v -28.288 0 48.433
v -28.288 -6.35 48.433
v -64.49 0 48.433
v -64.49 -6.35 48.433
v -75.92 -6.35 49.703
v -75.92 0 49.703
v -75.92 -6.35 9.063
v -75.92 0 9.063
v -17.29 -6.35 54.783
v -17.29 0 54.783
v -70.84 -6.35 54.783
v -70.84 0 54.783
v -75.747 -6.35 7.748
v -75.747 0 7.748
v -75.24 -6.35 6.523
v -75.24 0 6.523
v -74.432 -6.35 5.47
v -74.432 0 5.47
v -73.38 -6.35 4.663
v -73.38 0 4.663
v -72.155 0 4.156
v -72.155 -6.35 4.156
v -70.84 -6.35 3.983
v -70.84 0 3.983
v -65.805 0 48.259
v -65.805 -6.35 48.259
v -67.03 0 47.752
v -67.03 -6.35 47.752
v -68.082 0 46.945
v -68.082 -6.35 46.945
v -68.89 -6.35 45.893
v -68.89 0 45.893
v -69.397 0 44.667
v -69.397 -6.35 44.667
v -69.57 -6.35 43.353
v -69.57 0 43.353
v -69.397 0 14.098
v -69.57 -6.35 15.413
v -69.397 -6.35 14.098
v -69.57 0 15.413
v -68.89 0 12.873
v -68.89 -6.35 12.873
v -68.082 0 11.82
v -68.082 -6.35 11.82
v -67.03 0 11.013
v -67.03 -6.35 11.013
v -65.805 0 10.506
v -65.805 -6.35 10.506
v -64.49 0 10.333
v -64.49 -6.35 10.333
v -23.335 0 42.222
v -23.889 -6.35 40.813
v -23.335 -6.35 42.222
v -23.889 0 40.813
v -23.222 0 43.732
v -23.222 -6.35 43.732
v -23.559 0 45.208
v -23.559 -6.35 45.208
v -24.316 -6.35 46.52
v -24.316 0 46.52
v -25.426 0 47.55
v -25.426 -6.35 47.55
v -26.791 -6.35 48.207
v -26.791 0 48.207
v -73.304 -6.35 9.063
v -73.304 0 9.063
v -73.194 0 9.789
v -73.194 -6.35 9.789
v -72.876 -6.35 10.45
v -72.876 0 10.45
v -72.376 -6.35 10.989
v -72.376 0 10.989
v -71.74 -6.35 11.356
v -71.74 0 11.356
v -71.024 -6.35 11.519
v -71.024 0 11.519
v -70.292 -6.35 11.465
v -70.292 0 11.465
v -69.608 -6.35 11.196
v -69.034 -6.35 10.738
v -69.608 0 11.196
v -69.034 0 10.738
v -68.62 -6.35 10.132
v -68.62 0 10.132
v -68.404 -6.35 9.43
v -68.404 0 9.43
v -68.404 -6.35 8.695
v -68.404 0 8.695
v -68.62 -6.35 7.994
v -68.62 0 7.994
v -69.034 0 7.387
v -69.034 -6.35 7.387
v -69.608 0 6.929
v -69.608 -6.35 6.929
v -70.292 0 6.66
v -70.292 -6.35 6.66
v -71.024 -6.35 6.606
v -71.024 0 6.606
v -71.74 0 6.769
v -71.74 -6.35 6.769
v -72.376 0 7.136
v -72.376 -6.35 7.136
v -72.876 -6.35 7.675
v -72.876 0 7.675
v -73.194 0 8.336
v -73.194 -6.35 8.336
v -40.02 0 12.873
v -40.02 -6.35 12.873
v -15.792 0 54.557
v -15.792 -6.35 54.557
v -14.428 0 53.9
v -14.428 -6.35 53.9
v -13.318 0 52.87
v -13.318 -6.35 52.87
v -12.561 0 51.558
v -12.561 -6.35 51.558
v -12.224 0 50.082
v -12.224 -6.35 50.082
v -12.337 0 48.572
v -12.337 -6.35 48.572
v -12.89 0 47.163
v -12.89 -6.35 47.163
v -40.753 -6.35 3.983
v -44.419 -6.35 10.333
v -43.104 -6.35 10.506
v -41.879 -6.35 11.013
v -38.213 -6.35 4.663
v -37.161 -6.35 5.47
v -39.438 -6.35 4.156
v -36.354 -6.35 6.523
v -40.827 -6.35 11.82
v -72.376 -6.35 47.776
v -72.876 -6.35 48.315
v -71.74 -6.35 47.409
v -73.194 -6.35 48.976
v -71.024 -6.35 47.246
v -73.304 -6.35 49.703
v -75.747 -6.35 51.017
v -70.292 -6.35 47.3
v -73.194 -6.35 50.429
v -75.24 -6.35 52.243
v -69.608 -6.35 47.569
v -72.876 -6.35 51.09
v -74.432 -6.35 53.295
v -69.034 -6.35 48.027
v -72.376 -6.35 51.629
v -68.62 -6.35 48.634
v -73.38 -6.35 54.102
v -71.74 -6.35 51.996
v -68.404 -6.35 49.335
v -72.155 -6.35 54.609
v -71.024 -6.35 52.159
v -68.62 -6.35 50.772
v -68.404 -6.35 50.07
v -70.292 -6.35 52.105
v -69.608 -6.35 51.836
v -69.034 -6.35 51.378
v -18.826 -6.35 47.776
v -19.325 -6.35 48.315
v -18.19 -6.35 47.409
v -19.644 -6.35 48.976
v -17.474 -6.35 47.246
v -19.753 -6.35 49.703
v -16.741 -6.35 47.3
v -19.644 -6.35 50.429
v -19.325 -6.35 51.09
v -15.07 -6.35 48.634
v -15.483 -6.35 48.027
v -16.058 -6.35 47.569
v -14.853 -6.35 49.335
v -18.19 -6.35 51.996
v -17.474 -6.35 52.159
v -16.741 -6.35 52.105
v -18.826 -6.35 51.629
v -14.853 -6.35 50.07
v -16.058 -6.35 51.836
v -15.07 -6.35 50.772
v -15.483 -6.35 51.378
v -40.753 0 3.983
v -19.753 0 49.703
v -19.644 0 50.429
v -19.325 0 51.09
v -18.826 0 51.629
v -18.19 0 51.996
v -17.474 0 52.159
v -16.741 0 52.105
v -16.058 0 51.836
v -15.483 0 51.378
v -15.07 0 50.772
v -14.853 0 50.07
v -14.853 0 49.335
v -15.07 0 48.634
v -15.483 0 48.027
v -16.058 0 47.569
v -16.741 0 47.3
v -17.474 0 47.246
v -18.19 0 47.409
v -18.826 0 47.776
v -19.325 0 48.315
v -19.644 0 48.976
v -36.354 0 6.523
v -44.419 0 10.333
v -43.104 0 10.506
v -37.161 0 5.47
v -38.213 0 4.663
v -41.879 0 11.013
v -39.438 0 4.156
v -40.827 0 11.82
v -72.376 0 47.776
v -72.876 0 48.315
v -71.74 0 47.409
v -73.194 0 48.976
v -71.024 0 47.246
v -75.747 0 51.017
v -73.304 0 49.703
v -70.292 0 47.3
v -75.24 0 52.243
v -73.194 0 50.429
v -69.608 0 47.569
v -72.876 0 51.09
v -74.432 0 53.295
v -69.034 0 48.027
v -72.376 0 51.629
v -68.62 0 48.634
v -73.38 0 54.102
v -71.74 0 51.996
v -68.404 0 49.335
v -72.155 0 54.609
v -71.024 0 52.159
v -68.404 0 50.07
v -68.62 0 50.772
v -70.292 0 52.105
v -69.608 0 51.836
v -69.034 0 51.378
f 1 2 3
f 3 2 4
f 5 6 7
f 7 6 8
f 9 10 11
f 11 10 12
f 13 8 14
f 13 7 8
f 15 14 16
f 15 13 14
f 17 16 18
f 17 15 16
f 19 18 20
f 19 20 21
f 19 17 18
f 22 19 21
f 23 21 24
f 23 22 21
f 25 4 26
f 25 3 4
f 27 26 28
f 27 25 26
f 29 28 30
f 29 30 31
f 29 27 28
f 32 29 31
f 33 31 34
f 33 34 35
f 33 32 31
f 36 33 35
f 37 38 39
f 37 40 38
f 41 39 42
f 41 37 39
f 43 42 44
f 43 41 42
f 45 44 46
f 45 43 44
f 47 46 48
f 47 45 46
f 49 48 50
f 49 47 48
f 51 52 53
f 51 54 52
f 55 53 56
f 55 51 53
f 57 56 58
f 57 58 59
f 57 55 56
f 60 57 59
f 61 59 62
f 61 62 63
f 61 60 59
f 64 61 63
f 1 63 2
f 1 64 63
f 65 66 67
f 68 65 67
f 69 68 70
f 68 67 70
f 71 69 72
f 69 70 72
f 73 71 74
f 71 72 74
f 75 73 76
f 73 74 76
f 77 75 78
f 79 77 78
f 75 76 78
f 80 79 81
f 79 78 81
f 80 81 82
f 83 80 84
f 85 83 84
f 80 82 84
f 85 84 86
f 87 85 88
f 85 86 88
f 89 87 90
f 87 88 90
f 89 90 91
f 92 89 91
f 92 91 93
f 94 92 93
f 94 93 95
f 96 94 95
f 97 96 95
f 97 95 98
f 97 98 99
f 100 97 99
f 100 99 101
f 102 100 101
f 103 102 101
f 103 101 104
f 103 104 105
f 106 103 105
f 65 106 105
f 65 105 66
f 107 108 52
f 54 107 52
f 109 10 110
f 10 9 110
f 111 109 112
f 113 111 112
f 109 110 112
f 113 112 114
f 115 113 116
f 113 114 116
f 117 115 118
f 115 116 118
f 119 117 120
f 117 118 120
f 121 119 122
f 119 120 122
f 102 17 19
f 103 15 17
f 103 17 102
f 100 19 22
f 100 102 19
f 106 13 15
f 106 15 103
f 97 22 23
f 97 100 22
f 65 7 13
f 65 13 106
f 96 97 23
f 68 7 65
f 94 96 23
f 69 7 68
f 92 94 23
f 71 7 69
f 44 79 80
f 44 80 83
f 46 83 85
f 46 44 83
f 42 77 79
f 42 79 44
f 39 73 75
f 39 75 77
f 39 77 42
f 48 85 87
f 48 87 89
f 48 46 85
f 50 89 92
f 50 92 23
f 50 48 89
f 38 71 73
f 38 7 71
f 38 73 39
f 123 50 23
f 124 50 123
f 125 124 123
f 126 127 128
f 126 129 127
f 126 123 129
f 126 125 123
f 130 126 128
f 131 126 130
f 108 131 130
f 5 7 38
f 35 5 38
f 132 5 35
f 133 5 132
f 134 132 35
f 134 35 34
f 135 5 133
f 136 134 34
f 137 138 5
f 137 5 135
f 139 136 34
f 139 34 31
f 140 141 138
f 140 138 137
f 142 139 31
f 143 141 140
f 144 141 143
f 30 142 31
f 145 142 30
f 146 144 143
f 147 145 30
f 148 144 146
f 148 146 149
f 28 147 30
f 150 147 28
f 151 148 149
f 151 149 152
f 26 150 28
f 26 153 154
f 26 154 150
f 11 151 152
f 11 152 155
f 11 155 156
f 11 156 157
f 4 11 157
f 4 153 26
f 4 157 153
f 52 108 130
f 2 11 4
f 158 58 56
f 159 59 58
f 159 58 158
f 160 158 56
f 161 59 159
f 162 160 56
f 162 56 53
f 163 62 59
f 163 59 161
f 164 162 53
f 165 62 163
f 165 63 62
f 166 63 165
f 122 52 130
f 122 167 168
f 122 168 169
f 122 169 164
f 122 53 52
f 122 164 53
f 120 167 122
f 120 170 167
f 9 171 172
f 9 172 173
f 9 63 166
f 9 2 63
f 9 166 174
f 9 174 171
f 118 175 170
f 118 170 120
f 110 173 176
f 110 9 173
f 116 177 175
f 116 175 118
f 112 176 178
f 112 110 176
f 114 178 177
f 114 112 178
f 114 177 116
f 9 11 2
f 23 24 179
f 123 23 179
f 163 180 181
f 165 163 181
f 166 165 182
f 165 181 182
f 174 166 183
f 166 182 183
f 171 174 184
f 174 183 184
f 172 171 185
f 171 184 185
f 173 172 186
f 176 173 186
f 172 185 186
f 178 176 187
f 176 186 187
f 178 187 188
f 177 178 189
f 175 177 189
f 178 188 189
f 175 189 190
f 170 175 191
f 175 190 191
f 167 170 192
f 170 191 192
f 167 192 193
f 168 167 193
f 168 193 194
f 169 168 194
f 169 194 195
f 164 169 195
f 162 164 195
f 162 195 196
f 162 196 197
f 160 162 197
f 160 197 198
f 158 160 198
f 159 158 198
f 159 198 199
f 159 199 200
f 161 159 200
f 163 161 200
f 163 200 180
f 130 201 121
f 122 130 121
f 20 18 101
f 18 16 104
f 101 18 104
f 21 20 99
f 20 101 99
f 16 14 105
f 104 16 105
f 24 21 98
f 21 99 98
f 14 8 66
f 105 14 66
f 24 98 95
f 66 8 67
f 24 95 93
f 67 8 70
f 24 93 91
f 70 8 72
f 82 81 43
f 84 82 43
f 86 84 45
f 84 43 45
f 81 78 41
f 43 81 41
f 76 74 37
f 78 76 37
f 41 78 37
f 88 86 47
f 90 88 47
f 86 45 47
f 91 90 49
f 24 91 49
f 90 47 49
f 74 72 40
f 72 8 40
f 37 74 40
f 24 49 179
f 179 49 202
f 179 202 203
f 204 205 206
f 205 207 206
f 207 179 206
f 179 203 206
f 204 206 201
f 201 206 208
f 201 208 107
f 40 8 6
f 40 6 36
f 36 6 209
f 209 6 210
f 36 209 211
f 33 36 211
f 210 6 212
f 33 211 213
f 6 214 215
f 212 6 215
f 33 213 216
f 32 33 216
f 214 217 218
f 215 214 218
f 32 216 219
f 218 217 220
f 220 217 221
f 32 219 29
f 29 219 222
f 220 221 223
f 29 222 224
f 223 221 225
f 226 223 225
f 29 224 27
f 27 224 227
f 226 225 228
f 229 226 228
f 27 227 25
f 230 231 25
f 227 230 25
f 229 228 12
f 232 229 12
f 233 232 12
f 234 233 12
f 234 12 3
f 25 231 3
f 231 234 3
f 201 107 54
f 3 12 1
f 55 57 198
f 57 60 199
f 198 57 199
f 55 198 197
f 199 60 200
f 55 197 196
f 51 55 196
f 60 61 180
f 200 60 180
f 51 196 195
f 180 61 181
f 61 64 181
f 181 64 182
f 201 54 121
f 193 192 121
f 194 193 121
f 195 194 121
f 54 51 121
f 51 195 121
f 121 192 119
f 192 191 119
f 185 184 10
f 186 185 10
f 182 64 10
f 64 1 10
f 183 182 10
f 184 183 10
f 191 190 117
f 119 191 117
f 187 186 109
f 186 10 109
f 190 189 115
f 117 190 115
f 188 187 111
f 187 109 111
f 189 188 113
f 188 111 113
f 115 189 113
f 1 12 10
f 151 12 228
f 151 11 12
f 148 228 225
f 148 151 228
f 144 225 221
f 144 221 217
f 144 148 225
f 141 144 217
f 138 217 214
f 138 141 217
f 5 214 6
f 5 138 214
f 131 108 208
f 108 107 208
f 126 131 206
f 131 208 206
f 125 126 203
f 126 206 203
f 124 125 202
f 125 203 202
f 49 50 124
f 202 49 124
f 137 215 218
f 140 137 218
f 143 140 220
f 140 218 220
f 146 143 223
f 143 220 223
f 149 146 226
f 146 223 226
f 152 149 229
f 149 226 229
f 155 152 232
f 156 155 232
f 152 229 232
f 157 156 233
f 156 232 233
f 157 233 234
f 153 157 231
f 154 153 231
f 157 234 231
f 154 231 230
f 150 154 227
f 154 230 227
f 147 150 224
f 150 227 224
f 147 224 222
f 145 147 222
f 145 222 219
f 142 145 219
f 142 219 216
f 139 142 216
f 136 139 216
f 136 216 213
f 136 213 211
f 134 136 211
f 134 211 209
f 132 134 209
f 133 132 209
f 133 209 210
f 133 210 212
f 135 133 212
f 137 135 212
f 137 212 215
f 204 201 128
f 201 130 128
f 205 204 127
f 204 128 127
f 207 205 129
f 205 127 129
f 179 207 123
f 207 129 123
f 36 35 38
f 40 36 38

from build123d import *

# Parameters (mm, degrees)
F1_DEPTH = 6.35
F3_DEPTH = 25.4
F4_R     = 5.08
F5_R     = 5.08
F7_D     = 4.9276


with BuildPart() as f1:
    # F0 (on Front) → F1 (new body)
    with BuildSketch(Plane.XZ):
        Polygon((-8.49073, 54.782512), (-75.920123, 54.782512), (-75.920123, 3.982512), (-37.820123, 3.982512), align=None)
    extrude(amount=F1_DEPTH)

    # F2 (on face) → F3 (cut)
    with BuildSketch(Plane.XZ.offset(6.35)):
        Polygon((-41.486298, 10.332512), (-19.489252, 48.432512), (-69.570123, 48.432512), (-69.570123, 10.332512), align=None)
    extrude(amount=-F3_DEPTH, mode=Mode.SUBTRACT)

    # F4
    f4_edges = [f1.edges().sort_by_distance(p)[0] for p in [
        (-8.49073, -3.175, 54.782512),
        (-75.920123, -3.175, 54.782512),
        (-37.820123, -3.175, 3.982512),
        (-75.920123, -3.175, 3.982512),
    ]]
    fillet(f4_edges, radius=F4_R)

    # F5
    f5_edges = [f1.edges().sort_by_distance(p)[0] for p in [
        (-41.486298, -3.175, 10.332512),
        (-69.570123, -3.175, 10.332512),
        (-69.570123, -3.175, 48.432512),
        (-19.489252, -3.175, 48.432512),
    ]]
    fillet(f5_edges, radius=F5_R)

    # F7 (through all)
    with Locations(Plane.XZ.offset(6.35)):
        with Locations((-70.840123, 49.702512), (-70.840123, 9.062512), (-17.289548, 49.702512)):
            Hole(F7_D / 2)


solid = f1.part
